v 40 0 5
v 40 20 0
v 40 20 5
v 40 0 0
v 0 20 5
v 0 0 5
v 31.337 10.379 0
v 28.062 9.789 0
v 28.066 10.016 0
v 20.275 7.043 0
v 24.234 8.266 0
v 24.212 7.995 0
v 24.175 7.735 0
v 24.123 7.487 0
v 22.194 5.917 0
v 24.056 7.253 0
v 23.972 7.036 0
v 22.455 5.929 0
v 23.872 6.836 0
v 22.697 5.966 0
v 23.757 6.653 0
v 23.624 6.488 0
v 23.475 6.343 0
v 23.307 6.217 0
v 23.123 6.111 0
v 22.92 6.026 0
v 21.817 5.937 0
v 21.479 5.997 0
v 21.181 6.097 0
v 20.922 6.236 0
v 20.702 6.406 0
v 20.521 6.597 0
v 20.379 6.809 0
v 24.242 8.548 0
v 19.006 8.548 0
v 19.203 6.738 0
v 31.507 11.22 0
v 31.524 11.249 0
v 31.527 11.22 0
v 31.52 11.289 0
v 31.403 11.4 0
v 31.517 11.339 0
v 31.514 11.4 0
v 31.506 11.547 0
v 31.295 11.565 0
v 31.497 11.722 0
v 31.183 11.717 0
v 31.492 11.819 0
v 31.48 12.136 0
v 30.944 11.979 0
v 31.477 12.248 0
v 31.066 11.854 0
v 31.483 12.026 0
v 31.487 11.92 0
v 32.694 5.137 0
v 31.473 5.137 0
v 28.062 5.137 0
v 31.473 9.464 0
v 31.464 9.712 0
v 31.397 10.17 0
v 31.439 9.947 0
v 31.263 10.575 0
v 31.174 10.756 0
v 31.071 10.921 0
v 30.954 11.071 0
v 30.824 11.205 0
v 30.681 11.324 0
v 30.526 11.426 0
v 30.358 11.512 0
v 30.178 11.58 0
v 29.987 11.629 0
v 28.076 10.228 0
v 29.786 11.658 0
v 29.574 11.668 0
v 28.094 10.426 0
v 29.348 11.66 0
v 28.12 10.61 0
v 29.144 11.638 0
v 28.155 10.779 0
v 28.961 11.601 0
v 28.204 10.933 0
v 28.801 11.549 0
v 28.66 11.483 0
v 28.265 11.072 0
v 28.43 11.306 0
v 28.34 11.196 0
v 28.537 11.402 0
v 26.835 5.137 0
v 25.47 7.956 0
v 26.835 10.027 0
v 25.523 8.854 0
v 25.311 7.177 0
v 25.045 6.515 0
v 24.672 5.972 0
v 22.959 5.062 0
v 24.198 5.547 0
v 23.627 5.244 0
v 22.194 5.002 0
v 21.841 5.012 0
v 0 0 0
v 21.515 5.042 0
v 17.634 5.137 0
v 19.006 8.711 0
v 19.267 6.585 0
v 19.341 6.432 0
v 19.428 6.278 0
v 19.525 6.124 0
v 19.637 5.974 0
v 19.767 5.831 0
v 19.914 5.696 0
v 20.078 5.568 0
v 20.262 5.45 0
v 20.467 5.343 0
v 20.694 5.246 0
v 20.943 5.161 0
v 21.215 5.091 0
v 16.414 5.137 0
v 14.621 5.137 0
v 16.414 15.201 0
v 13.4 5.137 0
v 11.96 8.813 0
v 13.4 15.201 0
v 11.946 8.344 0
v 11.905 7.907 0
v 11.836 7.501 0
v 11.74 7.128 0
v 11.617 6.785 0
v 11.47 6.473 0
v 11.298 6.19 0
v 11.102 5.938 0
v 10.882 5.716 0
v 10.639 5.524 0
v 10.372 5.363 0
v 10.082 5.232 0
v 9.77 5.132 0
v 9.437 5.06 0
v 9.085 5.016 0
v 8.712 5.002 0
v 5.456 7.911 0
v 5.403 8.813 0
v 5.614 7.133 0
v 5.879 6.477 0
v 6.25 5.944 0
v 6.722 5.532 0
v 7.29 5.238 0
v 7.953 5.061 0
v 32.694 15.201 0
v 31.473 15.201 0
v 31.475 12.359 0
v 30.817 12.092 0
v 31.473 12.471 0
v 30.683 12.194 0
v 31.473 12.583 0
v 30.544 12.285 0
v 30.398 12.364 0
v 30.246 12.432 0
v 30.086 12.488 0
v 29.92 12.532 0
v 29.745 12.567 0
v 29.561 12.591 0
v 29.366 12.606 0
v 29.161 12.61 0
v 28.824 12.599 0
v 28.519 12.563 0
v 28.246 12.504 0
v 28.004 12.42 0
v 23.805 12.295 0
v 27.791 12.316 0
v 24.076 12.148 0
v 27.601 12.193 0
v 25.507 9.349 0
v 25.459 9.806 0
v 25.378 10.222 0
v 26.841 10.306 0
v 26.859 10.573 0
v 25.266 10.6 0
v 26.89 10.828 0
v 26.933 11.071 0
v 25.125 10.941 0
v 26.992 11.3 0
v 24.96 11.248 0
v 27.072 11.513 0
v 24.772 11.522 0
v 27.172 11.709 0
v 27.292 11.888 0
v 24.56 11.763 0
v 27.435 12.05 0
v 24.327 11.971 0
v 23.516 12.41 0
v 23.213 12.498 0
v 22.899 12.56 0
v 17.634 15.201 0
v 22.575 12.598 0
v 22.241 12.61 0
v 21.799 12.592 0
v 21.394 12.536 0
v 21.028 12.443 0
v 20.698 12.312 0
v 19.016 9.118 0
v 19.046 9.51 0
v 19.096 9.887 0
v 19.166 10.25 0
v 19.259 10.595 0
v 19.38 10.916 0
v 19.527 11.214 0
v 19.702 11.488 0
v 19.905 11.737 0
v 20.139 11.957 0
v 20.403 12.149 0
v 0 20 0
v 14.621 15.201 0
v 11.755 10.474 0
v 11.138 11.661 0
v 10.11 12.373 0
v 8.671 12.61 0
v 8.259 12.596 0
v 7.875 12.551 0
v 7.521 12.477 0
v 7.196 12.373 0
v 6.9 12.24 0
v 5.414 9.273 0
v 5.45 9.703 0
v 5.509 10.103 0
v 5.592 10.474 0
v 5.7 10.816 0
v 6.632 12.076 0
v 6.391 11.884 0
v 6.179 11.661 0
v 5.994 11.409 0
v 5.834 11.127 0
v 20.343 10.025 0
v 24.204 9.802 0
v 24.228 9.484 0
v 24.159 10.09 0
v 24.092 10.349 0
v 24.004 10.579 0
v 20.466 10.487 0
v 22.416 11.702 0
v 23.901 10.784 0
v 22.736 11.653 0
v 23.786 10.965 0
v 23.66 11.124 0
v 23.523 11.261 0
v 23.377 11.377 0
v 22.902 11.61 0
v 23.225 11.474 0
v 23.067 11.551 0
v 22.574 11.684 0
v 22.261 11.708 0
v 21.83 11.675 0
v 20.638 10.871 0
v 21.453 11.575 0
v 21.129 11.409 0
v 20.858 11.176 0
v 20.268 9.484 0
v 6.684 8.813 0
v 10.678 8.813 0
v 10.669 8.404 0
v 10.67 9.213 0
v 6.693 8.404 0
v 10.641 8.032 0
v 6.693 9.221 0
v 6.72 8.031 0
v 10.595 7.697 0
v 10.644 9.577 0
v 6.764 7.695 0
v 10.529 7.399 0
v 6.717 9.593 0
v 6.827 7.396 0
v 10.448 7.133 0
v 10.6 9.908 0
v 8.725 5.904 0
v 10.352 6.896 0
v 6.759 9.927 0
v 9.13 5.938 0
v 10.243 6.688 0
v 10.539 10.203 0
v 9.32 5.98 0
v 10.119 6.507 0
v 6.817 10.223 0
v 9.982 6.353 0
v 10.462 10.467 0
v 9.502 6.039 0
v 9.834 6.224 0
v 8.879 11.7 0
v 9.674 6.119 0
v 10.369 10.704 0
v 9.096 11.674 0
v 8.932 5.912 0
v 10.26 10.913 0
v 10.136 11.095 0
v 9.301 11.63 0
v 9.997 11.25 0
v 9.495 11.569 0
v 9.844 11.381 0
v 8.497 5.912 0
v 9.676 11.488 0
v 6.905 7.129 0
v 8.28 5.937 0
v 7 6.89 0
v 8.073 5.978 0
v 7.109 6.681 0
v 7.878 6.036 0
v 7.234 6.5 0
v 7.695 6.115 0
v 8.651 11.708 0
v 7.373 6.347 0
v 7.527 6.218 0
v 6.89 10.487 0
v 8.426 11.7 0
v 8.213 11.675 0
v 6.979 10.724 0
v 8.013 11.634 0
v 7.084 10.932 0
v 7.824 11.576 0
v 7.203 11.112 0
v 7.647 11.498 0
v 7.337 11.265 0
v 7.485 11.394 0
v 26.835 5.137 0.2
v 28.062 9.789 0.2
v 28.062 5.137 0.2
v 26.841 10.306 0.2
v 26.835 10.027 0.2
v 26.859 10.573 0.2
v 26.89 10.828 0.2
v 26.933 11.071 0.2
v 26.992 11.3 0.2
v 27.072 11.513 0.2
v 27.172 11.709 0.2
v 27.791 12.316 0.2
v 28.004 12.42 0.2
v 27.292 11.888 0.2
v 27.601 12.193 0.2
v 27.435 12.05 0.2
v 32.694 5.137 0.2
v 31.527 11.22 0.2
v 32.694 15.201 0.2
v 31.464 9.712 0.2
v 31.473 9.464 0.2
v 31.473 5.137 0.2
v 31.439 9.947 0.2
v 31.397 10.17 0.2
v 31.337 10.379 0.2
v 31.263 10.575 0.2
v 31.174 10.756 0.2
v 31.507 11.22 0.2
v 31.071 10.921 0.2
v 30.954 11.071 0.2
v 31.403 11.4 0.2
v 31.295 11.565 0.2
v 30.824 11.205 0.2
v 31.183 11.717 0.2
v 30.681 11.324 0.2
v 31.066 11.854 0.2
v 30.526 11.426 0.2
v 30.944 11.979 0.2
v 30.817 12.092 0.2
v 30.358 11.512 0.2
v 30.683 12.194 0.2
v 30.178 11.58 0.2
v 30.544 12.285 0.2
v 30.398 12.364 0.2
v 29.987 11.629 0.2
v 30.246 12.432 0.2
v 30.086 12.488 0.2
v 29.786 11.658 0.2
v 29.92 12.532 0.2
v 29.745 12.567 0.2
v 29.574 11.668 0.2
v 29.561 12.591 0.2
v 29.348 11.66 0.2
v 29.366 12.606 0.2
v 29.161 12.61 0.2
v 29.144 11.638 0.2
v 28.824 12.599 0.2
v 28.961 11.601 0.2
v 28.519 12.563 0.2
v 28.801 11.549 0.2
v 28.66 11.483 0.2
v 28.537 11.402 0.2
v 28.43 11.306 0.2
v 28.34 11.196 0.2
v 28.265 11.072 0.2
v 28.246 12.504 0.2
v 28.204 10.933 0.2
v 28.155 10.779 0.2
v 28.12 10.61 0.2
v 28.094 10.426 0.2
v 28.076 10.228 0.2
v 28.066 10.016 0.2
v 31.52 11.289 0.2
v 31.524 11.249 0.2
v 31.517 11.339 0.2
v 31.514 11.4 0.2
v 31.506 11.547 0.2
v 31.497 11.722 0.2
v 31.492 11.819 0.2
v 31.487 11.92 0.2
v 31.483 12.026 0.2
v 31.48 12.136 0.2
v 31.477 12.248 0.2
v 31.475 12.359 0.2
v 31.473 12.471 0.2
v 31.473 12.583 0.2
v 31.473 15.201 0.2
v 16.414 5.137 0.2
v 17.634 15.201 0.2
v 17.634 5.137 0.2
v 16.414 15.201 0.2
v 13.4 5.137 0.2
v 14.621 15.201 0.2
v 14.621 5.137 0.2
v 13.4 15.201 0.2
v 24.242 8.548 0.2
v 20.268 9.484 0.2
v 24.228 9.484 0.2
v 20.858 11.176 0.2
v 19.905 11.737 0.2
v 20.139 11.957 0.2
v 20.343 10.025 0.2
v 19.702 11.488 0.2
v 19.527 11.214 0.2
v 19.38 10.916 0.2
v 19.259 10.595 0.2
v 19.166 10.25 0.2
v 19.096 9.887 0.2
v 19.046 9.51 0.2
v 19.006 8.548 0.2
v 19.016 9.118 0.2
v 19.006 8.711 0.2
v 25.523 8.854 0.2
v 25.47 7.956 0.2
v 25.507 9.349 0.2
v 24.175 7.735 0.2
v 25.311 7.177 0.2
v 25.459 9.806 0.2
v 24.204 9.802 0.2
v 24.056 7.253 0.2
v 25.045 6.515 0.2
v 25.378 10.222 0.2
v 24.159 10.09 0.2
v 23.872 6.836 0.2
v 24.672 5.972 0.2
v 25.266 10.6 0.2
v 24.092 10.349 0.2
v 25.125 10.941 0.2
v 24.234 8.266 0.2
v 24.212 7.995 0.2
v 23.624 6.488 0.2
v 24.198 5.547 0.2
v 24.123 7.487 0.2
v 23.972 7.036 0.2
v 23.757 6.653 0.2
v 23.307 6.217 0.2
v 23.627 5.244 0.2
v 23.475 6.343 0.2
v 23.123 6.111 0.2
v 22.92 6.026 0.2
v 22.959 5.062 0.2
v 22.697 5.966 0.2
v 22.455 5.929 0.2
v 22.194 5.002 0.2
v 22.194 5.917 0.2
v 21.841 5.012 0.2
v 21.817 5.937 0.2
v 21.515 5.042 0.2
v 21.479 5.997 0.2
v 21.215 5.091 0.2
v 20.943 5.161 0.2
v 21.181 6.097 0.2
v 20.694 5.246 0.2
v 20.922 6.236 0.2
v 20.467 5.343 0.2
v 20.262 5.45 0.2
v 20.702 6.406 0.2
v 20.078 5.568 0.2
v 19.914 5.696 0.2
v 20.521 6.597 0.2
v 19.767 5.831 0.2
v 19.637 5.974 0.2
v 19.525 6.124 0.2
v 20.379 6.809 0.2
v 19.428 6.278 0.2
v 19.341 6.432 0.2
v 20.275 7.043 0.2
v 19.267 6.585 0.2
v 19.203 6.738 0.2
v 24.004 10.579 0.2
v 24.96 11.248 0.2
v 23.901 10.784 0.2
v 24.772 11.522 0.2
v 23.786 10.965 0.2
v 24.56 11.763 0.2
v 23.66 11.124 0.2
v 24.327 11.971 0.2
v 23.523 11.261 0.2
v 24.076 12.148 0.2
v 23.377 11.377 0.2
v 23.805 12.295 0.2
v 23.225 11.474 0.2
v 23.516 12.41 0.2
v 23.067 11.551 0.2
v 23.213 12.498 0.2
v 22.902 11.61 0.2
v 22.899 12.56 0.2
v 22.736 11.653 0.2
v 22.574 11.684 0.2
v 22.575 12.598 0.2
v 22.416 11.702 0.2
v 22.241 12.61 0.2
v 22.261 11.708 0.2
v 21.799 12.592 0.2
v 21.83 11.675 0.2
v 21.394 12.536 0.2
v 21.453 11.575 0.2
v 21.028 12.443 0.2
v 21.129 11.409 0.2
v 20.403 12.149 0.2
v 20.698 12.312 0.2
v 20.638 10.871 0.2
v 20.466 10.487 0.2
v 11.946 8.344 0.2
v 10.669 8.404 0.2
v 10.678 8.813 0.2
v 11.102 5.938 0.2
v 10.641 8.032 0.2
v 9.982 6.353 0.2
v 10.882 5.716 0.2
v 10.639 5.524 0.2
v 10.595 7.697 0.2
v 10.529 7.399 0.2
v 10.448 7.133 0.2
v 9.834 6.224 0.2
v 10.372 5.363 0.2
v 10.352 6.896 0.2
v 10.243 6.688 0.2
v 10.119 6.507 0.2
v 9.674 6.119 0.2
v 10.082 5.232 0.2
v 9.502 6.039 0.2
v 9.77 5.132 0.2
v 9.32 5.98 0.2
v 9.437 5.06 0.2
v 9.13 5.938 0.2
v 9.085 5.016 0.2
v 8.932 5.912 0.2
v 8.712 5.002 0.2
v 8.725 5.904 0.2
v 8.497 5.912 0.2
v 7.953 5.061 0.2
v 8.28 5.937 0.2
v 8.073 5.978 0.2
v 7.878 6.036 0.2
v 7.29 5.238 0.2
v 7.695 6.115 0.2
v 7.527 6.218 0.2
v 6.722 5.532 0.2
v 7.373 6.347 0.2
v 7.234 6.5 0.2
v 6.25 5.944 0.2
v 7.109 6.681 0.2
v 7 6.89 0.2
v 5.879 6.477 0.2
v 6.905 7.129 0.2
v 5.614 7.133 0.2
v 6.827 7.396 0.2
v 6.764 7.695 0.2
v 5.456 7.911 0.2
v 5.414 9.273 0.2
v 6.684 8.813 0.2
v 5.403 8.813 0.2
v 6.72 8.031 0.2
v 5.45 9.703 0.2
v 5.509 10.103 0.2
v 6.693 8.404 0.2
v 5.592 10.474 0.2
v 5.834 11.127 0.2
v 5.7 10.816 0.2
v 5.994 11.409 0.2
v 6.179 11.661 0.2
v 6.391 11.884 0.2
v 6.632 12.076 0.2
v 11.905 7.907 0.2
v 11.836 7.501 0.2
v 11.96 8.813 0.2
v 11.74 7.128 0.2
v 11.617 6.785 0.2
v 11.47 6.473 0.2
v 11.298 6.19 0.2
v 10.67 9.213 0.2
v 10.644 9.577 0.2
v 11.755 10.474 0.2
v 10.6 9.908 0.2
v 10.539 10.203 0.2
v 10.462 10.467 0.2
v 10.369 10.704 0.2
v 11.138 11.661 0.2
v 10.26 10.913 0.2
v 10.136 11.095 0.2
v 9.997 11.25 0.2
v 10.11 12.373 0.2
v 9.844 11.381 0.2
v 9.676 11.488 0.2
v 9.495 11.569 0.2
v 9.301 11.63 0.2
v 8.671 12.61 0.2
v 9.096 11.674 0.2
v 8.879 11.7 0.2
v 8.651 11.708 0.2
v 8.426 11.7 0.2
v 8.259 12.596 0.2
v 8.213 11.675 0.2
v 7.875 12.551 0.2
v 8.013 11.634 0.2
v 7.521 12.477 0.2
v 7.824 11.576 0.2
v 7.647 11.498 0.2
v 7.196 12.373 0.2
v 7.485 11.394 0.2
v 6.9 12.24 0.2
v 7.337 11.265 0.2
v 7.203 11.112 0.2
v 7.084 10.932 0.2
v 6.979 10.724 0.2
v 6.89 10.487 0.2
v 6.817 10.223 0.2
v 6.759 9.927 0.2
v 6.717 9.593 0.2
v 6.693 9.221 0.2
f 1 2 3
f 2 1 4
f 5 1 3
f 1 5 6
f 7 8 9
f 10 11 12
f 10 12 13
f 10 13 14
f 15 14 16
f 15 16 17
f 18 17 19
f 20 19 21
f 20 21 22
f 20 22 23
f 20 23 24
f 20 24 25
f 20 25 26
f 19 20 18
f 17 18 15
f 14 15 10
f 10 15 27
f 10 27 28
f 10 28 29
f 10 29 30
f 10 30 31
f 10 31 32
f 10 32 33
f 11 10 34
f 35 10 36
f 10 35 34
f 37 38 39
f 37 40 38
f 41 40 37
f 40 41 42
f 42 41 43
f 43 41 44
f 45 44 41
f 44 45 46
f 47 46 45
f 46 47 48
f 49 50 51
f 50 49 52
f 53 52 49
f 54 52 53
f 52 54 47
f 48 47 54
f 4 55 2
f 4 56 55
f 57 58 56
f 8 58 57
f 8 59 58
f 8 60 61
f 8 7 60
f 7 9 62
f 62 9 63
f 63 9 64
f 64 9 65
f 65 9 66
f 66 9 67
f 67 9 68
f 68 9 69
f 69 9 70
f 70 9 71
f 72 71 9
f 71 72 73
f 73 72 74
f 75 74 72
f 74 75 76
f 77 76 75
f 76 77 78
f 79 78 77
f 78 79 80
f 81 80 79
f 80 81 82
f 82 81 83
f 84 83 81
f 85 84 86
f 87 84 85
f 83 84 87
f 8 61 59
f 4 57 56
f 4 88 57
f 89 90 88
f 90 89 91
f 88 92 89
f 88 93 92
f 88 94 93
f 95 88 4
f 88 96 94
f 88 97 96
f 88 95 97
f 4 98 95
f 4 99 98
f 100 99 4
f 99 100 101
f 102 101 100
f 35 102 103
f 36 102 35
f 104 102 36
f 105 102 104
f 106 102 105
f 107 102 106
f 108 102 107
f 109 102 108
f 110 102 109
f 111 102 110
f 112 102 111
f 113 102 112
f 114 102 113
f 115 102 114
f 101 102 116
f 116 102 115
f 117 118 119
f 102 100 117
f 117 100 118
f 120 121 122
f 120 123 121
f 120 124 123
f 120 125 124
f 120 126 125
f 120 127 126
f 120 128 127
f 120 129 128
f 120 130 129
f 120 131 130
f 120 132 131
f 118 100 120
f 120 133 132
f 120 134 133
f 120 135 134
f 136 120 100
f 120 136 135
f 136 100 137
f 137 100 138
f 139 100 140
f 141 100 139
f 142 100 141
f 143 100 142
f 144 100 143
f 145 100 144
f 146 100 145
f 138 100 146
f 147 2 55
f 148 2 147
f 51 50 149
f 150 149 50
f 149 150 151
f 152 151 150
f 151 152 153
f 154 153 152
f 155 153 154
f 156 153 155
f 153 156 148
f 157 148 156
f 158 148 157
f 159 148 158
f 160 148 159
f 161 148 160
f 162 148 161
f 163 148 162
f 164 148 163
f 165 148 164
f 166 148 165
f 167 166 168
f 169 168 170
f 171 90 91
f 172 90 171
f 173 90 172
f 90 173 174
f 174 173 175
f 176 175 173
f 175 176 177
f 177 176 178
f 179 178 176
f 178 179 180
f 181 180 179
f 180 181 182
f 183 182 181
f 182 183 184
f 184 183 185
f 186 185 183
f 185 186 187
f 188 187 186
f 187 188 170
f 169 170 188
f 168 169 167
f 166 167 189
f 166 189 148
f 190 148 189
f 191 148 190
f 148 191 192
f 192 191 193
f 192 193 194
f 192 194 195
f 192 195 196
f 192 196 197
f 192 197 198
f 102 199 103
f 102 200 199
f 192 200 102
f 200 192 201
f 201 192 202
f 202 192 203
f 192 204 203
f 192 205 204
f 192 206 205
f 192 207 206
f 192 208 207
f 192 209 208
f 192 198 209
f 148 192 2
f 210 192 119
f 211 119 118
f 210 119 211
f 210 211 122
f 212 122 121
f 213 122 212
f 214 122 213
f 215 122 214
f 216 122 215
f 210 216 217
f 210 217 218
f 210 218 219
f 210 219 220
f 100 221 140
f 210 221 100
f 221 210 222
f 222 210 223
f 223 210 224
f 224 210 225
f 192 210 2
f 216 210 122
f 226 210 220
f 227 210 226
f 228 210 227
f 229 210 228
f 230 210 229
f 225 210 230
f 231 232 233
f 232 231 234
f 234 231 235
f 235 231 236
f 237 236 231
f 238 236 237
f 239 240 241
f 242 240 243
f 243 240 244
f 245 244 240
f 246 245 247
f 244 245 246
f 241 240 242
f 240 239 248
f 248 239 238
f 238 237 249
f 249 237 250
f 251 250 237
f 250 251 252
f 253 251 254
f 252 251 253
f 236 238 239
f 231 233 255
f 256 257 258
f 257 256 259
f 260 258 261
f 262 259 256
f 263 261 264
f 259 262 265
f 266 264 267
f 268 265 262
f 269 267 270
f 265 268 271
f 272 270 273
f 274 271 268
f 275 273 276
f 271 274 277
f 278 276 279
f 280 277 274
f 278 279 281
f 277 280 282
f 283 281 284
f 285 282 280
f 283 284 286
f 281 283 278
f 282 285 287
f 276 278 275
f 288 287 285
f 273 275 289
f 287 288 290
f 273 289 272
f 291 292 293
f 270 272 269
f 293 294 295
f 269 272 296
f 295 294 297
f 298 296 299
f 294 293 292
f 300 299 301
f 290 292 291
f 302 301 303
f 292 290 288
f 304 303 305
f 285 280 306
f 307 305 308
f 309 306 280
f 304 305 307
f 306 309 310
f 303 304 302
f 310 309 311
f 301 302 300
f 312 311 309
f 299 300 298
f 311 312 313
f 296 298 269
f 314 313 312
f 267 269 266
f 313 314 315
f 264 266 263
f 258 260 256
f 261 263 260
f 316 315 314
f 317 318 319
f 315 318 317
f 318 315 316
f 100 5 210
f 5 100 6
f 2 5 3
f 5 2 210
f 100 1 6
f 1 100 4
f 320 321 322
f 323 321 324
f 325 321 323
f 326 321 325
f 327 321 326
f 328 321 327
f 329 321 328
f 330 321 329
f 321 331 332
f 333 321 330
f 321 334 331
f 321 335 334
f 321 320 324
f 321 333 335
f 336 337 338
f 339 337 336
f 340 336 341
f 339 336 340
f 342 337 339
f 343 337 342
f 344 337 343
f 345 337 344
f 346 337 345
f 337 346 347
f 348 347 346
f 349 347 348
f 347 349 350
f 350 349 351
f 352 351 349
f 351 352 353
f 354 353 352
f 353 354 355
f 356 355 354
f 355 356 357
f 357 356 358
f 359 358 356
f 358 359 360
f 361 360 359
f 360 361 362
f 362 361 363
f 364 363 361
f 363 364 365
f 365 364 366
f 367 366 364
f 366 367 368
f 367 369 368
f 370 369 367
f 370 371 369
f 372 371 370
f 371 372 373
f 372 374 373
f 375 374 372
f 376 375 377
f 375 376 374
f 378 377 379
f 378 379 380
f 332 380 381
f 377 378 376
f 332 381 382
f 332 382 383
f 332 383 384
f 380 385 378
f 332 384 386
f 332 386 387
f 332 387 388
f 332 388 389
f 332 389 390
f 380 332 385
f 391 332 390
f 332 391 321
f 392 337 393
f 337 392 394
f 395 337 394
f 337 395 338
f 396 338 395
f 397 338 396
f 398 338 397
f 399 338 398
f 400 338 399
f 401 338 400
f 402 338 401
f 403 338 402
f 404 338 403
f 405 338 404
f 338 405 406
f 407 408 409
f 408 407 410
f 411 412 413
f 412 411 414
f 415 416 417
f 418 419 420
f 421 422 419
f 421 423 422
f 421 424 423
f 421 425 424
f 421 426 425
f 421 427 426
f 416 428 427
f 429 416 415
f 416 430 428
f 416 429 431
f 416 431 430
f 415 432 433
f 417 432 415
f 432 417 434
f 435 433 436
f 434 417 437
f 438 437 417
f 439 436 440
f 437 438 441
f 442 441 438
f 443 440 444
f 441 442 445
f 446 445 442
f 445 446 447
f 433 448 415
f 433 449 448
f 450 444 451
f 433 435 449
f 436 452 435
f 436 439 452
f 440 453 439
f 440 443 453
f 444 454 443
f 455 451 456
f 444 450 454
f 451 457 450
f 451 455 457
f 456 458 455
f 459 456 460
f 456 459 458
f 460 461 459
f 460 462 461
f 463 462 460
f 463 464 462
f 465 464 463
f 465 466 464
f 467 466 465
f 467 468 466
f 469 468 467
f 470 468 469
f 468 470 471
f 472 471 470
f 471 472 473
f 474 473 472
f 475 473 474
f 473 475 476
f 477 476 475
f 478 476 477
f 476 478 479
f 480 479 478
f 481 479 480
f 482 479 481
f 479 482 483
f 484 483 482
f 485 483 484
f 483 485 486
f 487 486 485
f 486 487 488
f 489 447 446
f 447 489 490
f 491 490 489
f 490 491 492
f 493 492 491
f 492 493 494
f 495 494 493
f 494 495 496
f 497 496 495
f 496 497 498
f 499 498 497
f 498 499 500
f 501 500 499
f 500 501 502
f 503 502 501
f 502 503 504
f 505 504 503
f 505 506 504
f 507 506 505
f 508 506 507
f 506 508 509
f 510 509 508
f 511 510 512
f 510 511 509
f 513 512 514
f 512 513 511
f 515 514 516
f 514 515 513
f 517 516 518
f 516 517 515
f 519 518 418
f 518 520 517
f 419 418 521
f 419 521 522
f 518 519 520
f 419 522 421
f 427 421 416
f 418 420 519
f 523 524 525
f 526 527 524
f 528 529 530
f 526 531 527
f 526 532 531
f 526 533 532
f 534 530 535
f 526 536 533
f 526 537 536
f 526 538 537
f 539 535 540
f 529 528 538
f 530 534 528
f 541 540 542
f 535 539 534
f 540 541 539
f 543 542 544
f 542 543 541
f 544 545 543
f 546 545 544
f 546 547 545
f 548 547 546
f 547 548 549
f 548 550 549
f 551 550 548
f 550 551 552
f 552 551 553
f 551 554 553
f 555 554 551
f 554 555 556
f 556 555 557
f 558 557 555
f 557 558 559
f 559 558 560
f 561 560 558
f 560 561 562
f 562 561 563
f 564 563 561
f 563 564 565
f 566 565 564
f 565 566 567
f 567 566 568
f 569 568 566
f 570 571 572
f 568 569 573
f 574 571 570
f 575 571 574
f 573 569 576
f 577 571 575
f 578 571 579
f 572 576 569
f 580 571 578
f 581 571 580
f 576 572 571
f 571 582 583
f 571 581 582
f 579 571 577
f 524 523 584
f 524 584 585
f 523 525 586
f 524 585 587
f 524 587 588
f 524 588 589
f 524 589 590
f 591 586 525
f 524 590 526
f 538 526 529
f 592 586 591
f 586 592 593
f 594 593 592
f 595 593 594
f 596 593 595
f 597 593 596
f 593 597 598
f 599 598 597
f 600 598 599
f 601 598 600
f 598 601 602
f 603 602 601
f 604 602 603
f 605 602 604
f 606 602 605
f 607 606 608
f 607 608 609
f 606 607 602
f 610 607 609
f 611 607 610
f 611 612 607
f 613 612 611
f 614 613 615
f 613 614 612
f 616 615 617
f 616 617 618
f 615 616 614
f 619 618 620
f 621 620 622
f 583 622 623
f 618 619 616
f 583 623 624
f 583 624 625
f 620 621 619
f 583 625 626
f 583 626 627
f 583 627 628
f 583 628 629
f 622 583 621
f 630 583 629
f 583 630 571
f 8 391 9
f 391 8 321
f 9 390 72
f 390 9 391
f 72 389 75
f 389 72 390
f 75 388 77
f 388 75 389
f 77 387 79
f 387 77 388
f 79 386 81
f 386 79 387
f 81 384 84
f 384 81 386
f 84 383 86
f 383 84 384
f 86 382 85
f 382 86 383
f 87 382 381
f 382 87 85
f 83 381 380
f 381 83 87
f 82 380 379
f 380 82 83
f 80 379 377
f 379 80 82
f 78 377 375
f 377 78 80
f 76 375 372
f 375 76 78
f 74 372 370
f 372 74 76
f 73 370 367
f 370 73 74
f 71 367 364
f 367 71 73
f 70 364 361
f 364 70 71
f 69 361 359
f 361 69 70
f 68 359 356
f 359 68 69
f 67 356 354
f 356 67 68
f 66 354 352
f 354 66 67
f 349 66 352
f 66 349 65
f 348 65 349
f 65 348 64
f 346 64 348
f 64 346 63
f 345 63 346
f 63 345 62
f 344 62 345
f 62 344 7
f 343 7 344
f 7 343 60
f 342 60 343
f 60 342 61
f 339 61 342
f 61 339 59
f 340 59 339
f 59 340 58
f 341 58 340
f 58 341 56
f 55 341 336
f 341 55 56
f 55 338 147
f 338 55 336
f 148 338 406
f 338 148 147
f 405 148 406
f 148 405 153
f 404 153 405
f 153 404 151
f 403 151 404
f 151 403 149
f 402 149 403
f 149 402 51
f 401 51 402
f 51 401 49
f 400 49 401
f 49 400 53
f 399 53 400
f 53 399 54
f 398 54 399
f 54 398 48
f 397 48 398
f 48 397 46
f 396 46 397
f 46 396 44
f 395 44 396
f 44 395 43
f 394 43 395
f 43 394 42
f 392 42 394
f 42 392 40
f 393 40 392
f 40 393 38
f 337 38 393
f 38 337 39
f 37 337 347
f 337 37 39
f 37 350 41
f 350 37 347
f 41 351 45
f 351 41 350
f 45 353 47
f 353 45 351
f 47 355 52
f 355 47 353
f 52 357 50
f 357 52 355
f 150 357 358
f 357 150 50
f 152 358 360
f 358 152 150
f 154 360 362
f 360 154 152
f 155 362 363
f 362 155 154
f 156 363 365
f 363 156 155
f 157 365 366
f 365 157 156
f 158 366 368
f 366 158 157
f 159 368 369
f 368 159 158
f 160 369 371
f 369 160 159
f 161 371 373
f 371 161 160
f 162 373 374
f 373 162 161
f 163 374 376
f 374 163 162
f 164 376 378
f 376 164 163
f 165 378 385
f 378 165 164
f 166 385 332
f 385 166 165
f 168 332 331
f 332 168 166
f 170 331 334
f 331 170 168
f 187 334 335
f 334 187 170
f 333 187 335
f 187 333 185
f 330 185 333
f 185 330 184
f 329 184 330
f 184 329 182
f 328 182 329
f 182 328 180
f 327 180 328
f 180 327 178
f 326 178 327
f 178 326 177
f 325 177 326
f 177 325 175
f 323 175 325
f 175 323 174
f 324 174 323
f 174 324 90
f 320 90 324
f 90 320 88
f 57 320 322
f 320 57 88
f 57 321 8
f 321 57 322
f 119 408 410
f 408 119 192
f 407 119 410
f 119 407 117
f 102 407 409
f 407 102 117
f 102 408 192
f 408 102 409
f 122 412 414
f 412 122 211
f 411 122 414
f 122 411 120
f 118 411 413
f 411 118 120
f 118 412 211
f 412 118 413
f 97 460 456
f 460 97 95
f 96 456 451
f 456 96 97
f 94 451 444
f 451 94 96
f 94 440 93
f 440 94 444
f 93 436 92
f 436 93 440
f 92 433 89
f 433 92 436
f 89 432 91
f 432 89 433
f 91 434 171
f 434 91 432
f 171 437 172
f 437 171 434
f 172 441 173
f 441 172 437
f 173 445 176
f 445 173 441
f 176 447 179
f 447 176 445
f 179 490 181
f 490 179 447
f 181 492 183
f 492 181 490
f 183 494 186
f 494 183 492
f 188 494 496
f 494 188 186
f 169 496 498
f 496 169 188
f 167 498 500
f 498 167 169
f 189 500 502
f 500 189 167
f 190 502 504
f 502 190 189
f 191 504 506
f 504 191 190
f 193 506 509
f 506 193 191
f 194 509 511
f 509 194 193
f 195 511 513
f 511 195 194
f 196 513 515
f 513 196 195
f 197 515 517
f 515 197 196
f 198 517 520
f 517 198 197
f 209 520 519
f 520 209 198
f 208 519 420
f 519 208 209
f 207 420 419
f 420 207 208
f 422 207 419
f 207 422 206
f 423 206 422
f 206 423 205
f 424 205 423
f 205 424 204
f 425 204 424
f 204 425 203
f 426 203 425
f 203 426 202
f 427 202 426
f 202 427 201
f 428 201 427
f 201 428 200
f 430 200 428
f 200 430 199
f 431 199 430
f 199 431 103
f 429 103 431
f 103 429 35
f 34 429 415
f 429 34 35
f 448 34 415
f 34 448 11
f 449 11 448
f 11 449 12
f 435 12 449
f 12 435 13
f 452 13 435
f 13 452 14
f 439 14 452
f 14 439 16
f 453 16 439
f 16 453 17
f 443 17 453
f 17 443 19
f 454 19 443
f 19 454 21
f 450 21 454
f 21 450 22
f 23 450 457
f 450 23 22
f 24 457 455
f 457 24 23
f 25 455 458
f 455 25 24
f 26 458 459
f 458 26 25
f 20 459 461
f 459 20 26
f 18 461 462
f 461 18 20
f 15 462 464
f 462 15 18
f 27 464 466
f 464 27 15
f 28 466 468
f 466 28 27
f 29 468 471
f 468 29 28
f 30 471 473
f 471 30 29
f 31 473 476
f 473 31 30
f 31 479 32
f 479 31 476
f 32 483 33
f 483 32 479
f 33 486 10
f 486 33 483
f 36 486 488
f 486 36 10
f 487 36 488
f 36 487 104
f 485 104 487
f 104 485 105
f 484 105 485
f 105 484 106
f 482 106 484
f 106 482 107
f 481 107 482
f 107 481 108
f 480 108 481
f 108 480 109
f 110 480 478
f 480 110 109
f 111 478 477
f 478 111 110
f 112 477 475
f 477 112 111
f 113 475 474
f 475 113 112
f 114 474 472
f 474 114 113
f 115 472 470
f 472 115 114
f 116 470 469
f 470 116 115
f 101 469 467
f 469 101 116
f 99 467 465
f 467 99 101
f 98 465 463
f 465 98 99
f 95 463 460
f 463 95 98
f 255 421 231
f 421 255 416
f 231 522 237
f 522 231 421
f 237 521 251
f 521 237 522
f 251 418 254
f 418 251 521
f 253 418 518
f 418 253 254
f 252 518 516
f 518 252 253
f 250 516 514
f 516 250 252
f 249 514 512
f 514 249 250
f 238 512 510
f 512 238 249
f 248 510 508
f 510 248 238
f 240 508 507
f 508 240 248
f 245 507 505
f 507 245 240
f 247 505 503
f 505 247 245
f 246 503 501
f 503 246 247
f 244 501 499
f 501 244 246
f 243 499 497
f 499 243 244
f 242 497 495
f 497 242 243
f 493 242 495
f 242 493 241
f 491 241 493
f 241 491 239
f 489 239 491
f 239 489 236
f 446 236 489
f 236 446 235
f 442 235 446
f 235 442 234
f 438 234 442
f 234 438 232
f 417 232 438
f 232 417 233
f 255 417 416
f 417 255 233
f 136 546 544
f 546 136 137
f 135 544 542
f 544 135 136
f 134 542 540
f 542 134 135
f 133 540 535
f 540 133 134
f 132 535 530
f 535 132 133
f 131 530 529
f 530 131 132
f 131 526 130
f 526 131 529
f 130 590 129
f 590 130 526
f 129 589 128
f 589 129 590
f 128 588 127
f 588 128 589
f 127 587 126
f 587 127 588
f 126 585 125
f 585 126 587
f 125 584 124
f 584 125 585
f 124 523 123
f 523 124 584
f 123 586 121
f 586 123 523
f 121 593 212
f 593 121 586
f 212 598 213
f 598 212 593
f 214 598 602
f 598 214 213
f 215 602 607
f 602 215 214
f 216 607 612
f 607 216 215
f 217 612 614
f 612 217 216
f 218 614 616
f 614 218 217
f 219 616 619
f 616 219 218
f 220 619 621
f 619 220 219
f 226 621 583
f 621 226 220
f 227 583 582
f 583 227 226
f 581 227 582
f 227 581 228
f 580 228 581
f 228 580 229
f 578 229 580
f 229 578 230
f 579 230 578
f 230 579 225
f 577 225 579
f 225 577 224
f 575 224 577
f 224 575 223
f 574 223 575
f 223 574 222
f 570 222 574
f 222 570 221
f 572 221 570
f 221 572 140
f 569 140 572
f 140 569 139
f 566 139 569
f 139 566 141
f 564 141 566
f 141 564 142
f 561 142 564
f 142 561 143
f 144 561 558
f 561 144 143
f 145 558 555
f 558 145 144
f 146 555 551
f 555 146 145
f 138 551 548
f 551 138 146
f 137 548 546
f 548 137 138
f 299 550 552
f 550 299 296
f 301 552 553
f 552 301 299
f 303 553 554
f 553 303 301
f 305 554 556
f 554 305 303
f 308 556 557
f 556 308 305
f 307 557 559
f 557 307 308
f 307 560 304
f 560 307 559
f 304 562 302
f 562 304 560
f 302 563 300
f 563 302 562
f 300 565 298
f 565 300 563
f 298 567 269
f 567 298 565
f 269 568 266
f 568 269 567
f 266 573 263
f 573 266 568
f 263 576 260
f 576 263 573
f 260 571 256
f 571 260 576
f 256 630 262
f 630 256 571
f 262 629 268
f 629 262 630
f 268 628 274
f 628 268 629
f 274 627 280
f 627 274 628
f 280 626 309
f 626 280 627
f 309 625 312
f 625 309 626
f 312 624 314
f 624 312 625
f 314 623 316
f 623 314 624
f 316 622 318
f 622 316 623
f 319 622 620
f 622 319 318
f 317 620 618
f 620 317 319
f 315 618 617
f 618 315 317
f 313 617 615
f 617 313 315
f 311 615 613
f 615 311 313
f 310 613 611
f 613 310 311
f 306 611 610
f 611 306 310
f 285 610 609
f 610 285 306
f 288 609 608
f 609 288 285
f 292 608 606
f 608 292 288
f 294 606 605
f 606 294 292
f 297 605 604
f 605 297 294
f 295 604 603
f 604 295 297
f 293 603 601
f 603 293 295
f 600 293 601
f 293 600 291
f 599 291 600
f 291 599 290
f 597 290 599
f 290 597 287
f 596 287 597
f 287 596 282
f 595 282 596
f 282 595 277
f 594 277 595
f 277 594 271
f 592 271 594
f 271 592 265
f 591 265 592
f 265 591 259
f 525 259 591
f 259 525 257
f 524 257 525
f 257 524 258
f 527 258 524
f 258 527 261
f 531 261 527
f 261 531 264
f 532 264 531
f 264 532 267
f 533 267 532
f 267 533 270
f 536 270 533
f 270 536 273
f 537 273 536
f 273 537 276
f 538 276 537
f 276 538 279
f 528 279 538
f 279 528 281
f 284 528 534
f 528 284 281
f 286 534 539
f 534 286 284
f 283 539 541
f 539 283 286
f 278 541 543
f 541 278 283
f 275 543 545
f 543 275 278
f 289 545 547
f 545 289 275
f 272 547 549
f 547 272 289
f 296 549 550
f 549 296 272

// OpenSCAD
difference() {
  cube([40,20,5]);
  //#translate([6,6,0])   linear_extrude(.2) rotate(a=180,[0,1,1])text("hello");
  #translate([5,5,0]) linear_extrude(.2) mirror([1,0,0]) text("hello",halign="right",valign="bottom");
}
